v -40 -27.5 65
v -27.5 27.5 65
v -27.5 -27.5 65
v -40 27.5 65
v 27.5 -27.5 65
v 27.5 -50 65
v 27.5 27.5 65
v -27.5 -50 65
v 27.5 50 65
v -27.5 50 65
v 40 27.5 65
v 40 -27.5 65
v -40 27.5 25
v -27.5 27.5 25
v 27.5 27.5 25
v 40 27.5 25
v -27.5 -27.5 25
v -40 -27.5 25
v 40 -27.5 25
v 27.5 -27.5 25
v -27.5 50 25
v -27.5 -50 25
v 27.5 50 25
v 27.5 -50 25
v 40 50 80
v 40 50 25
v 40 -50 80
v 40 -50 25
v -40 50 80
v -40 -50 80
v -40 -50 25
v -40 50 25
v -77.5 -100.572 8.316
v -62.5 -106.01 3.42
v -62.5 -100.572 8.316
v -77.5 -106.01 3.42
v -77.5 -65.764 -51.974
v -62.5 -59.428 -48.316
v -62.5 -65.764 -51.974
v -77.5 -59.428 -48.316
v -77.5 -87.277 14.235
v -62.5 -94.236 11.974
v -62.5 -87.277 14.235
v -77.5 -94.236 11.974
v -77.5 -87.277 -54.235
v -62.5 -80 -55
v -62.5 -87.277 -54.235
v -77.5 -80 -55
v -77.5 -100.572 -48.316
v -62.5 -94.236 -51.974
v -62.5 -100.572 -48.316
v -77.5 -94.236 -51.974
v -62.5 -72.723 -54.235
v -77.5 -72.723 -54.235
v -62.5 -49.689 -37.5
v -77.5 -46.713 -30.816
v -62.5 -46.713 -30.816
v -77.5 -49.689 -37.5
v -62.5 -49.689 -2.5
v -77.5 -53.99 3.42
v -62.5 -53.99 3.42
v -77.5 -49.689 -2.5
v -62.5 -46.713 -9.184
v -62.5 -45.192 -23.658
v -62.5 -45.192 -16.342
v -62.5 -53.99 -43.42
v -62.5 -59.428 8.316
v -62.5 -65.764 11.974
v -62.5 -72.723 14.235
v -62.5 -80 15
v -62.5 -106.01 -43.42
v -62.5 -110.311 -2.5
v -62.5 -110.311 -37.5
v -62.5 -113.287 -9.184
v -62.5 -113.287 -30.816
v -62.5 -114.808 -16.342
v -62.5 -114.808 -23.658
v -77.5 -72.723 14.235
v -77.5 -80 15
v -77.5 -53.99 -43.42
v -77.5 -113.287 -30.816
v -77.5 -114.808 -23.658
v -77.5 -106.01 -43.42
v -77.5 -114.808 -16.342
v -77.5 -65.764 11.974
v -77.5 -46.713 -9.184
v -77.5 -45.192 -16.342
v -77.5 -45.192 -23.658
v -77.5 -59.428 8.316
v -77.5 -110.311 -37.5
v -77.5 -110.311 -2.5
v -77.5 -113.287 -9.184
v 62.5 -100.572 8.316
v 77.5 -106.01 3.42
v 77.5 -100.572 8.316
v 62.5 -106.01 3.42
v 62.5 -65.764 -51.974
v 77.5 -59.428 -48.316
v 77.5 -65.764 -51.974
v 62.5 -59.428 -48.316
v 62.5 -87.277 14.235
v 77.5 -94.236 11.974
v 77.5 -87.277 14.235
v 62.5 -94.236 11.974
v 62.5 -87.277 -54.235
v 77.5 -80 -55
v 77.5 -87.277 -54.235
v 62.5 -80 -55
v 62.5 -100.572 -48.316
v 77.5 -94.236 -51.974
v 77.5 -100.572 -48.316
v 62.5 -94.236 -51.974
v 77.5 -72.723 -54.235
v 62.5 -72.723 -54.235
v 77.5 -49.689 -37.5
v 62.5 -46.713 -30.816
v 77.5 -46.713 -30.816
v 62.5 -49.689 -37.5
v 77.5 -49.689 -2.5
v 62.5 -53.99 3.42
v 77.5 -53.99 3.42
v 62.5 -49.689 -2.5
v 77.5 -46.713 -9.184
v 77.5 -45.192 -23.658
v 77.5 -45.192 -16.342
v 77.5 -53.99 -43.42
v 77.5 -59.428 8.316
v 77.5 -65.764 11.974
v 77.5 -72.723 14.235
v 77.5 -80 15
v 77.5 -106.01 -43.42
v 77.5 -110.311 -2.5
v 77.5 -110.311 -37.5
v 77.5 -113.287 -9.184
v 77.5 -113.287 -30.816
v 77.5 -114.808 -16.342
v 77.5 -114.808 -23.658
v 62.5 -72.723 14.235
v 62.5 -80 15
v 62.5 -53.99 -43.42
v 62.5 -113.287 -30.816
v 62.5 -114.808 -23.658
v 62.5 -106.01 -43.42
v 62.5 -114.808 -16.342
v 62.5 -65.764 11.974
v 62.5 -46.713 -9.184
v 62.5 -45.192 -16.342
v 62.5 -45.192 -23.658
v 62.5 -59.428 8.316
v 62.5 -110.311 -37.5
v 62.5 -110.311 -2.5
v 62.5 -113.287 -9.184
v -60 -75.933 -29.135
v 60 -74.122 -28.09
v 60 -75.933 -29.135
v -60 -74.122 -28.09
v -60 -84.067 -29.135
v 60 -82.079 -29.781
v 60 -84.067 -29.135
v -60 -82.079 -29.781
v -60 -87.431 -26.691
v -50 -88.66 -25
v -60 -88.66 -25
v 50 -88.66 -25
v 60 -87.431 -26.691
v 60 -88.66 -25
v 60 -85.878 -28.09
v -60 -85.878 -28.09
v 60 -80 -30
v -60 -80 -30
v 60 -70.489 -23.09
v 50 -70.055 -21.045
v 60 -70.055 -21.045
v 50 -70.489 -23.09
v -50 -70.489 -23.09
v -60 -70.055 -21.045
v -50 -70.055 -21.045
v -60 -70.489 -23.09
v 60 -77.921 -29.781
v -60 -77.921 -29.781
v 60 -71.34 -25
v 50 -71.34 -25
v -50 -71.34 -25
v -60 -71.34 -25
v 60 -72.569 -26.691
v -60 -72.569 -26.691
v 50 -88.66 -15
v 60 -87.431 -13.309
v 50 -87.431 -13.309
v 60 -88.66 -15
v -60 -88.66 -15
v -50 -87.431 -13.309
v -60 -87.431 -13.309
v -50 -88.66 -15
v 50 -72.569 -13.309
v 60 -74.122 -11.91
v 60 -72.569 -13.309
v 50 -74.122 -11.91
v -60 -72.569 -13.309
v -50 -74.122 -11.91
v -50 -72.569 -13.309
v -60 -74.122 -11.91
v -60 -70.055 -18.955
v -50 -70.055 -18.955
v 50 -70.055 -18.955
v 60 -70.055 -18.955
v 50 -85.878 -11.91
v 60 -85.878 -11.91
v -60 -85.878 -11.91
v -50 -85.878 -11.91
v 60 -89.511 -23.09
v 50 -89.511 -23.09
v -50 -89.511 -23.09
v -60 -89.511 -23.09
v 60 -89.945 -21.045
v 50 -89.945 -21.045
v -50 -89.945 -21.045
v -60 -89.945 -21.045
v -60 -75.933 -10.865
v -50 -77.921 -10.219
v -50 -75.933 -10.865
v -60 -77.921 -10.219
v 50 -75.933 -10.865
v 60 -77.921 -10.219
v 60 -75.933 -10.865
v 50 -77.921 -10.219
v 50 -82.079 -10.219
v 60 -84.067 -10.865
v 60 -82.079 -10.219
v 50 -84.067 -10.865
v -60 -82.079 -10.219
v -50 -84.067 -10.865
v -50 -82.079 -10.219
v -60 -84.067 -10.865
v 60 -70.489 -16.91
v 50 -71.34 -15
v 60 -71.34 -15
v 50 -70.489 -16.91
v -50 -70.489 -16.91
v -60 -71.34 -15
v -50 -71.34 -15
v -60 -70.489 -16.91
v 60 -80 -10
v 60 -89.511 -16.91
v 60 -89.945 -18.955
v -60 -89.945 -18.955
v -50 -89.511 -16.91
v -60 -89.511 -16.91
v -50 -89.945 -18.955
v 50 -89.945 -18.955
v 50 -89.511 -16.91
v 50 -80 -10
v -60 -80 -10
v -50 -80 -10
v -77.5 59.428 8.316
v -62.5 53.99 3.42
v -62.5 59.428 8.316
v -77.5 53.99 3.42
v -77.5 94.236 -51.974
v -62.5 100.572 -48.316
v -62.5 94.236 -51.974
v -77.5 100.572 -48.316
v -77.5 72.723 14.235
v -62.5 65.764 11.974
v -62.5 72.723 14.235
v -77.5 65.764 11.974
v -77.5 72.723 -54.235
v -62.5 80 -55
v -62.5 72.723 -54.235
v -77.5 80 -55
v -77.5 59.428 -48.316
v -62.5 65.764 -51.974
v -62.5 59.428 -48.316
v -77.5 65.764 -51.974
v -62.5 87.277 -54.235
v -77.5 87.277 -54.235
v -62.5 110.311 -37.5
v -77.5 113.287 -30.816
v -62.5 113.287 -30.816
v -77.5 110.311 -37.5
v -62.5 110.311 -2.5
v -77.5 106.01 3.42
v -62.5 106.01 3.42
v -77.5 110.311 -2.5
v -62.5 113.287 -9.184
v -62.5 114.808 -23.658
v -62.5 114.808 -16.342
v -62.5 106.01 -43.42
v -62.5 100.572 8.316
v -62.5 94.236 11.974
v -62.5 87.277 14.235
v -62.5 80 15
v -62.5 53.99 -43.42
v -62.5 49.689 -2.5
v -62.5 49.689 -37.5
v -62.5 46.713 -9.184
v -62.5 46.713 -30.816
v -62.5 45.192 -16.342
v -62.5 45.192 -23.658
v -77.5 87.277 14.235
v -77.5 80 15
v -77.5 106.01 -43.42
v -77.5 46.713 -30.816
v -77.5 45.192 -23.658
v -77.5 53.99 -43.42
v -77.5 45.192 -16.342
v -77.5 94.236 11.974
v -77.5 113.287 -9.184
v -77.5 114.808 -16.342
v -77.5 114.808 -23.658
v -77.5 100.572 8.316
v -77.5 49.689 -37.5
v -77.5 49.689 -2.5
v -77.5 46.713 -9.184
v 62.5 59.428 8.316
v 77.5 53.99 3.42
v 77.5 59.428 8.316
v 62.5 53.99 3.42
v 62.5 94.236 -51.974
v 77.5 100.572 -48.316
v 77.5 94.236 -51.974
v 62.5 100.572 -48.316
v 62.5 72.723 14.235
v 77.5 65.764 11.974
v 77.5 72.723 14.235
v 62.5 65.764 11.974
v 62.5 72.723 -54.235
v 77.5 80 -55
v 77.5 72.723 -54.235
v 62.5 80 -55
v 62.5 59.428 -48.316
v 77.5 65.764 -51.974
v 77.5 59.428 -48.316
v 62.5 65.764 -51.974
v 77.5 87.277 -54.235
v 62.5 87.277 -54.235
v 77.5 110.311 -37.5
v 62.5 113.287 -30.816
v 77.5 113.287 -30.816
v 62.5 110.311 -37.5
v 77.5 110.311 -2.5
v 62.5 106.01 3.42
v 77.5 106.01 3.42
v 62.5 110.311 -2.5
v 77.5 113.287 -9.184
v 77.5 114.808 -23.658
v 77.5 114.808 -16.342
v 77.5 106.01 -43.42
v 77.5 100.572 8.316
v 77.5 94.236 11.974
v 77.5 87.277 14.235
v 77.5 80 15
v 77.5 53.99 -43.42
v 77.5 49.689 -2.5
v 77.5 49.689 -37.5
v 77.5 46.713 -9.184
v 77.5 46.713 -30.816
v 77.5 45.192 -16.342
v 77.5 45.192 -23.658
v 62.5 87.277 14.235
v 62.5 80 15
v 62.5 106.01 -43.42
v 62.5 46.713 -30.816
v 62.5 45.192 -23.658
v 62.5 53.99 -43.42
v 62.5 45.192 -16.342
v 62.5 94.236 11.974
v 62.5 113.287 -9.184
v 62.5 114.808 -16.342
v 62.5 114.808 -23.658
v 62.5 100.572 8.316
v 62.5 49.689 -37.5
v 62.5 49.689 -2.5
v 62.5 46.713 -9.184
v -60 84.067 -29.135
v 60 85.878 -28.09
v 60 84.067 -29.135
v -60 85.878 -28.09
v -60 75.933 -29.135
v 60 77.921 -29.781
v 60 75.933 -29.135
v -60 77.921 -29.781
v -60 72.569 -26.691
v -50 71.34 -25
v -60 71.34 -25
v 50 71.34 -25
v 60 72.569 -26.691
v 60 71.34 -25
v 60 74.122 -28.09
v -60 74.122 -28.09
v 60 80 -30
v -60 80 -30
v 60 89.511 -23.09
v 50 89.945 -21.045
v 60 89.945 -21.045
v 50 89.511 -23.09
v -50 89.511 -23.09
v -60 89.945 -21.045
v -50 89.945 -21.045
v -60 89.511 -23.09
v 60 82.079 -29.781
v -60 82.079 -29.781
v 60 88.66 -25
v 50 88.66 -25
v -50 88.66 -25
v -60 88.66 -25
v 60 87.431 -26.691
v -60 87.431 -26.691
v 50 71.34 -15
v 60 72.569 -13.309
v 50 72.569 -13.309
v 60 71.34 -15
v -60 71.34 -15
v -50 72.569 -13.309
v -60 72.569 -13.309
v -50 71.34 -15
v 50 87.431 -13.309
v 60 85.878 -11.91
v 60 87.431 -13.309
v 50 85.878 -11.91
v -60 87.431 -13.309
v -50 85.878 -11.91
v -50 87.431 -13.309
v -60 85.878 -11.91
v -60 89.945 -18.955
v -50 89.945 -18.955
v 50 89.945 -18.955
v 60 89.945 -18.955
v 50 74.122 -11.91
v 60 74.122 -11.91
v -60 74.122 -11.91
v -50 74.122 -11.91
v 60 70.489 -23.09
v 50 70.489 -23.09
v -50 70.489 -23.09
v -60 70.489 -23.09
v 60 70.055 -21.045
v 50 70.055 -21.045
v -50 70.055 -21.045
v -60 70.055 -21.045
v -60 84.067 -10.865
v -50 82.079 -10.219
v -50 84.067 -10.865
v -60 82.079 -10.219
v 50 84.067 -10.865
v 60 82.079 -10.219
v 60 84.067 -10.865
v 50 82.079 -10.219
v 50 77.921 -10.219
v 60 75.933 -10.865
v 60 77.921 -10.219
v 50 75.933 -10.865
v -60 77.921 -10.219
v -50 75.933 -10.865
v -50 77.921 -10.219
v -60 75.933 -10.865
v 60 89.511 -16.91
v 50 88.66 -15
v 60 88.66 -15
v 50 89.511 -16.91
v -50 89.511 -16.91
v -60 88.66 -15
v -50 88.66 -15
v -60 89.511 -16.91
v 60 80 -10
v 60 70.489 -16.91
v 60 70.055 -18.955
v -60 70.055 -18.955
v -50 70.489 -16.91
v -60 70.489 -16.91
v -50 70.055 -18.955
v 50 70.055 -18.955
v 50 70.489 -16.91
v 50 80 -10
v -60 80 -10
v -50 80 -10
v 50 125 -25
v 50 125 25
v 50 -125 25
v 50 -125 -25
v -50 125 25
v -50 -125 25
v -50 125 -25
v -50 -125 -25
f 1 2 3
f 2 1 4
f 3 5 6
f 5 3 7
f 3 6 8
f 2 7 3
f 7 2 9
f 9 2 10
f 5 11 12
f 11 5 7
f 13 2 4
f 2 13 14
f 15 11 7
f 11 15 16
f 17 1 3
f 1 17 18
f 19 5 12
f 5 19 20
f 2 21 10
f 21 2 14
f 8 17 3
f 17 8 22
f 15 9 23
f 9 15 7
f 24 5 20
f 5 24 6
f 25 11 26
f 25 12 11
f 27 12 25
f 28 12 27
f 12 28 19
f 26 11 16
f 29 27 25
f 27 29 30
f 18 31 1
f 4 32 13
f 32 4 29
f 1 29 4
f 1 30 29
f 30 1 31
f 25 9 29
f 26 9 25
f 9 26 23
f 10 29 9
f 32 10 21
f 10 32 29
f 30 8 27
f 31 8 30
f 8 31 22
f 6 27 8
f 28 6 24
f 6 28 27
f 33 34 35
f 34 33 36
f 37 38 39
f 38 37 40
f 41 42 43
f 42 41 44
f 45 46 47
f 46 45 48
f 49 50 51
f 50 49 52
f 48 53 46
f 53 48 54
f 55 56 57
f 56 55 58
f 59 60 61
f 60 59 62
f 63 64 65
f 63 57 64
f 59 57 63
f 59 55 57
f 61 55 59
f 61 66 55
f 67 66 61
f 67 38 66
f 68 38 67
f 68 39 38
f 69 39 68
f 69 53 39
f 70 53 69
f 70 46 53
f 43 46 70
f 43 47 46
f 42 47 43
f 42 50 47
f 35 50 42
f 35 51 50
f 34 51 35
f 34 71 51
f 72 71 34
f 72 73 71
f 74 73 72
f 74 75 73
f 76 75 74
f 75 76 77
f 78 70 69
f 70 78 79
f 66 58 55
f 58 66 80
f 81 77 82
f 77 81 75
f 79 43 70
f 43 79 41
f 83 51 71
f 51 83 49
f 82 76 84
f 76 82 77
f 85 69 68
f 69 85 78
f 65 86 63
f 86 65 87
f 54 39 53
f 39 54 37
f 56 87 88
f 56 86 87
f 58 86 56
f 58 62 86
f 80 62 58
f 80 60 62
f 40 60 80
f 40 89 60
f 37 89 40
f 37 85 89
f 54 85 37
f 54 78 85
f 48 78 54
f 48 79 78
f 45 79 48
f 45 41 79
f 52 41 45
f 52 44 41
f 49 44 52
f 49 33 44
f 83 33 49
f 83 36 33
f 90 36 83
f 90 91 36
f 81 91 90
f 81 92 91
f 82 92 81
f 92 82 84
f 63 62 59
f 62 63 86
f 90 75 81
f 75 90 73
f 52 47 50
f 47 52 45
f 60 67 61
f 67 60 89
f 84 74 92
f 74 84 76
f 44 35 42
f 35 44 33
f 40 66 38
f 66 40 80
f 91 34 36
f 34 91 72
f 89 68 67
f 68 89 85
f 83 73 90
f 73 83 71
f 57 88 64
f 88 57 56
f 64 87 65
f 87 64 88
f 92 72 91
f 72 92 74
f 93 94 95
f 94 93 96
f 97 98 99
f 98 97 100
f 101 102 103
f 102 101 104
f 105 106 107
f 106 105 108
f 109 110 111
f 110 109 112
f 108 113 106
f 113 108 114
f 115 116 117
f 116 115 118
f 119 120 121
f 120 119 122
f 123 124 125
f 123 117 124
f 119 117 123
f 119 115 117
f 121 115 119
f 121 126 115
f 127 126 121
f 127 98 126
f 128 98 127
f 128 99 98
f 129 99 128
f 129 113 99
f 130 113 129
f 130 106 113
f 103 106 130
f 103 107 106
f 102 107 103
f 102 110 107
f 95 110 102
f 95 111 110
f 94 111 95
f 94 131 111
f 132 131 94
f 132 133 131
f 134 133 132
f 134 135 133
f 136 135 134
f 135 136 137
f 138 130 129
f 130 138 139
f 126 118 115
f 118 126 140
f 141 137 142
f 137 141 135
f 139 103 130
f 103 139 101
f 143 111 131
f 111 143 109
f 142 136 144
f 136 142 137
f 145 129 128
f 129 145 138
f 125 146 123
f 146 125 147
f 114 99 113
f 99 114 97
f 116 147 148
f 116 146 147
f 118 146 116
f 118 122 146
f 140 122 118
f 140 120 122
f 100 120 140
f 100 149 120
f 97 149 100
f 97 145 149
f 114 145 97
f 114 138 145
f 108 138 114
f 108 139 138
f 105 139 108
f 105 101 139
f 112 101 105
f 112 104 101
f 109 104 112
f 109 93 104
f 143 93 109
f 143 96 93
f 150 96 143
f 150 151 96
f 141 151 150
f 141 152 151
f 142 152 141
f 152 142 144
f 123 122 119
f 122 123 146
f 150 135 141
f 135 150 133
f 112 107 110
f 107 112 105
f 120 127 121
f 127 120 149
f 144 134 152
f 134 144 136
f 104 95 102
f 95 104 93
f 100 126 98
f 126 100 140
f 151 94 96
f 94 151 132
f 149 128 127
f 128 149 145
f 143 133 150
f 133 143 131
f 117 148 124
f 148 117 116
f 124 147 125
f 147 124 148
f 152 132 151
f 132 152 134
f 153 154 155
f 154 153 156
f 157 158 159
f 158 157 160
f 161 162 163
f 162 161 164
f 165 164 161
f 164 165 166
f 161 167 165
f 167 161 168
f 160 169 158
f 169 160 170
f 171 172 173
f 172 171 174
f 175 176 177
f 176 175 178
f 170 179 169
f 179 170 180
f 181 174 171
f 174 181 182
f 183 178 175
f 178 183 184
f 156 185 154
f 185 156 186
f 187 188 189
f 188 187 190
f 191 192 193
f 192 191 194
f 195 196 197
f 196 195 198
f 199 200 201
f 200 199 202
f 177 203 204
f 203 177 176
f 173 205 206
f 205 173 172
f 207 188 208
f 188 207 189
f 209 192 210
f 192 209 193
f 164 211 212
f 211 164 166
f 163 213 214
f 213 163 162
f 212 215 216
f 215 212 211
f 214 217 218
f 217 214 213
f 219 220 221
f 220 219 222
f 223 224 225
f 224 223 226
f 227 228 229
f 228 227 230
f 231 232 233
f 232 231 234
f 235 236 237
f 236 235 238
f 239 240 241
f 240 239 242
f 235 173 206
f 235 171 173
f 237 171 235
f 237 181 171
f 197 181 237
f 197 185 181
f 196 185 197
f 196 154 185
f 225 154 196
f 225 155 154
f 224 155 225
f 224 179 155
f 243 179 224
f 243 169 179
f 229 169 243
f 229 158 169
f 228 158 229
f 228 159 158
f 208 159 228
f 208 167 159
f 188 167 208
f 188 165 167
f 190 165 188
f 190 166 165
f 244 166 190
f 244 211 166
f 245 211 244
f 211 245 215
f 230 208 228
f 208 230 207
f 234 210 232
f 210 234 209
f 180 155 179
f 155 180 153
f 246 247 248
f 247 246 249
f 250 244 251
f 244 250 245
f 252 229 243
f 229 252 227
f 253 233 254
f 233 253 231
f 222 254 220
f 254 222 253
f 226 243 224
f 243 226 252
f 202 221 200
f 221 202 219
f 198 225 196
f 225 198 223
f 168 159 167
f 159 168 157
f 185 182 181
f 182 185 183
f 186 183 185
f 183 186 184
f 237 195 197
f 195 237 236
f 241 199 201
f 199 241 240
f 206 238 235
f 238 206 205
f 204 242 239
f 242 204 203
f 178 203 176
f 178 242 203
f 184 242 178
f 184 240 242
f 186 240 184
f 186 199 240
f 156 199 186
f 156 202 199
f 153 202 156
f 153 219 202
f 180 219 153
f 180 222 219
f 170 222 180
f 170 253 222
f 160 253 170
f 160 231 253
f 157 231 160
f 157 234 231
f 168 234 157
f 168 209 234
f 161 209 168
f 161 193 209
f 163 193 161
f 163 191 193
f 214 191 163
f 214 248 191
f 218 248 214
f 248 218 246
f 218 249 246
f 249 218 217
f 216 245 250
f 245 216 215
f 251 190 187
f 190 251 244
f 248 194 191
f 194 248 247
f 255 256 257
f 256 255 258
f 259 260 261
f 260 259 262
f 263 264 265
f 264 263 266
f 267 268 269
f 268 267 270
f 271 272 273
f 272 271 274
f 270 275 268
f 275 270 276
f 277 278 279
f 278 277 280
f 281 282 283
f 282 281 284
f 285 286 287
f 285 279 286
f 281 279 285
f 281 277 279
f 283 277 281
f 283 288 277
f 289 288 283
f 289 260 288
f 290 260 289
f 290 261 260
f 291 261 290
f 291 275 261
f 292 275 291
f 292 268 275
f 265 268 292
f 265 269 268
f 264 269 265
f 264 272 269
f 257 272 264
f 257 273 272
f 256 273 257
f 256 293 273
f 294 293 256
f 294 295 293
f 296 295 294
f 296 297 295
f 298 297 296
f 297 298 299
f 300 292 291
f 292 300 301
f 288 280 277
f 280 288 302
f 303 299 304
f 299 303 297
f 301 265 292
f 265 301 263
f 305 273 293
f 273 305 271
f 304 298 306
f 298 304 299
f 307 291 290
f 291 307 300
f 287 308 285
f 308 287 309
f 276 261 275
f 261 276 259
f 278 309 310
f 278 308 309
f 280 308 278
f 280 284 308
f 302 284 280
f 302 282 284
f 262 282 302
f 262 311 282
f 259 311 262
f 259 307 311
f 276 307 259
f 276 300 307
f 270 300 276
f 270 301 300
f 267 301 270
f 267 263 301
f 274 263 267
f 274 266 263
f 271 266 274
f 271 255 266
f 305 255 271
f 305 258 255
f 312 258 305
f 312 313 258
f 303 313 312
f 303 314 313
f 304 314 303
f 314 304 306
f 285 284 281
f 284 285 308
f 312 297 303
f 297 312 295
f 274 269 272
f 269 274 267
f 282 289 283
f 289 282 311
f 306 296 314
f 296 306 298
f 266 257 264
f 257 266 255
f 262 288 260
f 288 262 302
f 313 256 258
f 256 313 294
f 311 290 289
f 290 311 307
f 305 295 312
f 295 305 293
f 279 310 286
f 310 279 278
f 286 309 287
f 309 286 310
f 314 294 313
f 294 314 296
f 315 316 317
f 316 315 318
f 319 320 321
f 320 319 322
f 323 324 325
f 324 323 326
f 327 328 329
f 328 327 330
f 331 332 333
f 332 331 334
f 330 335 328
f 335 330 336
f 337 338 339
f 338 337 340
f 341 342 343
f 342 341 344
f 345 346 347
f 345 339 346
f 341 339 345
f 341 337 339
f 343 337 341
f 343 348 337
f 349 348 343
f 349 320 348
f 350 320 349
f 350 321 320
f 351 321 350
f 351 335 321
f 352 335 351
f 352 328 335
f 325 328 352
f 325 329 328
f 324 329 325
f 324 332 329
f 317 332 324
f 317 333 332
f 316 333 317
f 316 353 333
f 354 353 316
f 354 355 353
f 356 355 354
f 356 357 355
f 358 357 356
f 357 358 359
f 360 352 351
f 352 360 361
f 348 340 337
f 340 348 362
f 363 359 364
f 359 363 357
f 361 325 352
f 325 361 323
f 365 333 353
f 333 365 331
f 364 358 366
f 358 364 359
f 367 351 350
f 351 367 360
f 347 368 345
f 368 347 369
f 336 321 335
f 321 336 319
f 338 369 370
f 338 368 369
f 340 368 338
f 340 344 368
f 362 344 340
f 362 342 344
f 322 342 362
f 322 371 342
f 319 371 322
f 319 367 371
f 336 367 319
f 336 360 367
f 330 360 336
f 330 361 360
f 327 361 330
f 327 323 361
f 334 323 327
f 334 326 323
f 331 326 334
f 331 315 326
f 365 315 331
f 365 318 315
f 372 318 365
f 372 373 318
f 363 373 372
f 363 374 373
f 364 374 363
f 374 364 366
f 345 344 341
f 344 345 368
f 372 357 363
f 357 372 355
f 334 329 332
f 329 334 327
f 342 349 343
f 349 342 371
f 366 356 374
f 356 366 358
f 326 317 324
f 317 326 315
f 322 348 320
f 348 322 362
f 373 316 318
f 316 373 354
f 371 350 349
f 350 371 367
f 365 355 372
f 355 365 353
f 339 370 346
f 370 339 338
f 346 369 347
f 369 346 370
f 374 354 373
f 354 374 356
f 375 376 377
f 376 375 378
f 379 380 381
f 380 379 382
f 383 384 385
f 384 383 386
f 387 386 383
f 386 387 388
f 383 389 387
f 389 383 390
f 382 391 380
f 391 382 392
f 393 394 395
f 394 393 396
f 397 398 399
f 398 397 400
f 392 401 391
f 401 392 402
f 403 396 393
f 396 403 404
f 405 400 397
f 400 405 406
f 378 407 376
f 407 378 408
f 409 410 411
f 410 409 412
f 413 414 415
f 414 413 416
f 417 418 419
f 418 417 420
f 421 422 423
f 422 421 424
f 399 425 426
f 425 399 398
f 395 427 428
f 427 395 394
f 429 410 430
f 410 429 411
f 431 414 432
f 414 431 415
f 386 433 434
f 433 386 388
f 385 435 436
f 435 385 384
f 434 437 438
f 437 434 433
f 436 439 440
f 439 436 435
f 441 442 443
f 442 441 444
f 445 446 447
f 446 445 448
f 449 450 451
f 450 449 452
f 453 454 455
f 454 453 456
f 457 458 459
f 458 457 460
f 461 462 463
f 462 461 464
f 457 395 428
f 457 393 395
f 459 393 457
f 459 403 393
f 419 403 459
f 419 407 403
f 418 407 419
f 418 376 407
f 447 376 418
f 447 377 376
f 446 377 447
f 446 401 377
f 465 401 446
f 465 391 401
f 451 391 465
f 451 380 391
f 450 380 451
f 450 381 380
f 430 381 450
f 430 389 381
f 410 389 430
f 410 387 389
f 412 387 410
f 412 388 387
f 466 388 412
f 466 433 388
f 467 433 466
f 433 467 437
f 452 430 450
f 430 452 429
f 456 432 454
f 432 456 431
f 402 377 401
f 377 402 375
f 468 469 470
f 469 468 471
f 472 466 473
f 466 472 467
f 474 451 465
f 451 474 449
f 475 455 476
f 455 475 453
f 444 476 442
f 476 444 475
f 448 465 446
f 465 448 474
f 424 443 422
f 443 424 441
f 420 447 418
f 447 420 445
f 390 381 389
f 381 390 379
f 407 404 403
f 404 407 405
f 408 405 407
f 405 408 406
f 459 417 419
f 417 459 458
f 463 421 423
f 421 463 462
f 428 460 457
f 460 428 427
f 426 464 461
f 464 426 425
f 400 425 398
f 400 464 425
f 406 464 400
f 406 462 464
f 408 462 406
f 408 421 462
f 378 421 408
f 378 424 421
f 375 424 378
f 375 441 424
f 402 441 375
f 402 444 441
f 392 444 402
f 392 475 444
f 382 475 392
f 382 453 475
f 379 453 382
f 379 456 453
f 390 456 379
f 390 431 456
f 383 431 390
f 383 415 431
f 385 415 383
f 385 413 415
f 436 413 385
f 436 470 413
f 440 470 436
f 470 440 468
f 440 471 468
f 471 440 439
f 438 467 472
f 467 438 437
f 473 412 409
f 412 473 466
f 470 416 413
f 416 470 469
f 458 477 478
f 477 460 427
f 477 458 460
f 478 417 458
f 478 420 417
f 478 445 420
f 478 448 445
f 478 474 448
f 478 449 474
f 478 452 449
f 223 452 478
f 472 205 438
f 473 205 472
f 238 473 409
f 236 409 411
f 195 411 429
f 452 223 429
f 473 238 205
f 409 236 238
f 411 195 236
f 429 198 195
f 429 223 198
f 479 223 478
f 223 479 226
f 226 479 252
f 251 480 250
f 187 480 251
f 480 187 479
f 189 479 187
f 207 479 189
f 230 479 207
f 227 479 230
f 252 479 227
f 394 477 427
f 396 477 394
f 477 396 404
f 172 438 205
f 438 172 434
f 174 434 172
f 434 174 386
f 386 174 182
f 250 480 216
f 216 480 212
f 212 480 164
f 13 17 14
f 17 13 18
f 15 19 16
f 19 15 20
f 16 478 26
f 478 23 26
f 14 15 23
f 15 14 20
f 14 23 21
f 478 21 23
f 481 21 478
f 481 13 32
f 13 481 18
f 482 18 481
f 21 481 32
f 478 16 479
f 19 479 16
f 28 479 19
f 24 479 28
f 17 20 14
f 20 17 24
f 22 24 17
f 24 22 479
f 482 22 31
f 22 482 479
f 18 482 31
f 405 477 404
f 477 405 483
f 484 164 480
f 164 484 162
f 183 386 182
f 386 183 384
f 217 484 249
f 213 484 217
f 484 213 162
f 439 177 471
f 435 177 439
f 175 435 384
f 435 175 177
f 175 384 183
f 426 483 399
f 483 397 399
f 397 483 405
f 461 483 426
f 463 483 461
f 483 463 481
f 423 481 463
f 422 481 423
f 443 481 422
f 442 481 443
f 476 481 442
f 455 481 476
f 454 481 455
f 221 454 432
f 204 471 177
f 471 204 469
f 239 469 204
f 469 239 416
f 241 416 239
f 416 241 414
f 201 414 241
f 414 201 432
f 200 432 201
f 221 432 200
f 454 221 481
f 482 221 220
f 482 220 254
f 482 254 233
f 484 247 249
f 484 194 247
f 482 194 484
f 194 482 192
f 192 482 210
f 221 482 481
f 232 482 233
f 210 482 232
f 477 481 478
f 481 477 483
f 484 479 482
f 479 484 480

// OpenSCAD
union() {
	cube(center = true, size = [100, 250, 50]);
	translate(v = [0, 0, 50]) {
		difference() {
			cube(center = true, size = [80, 100, 60]);
			union() {
				translate(v = [0, 0, -10]) {
					cube(center = true, size = [200, 55, 50]);
				}
				rotate(a = [0, 0, 90]) {
					translate(v = [0, 0, -10]) {
						cube(center = true, size = [200, 55, 50]);
					}
				}
			}
		}
	}
	translate(v = [0, -80, 0]) {
		translate(v = [0, 0, -20]) {
			union() {
				translate(v = [-70, 0, 0]) {
					rotate(a = [0, 90, 0]) {
						cylinder(center = true, h = 15, r = 35);
					}
				}
				translate(v = [70, 0, 0]) {
					rotate(a = [0, 90, 0]) {
						cylinder(center = true, h = 15, r = 35);
					}
				}
				rotate(a = [0, 90, 0]) {
					cylinder(center = true, h = 120, r = 10);
				}
			}
		}
	}
	translate(v = [0, 160, 0]) {
		translate(v = [0, -80, 0]) {
			translate(v = [0, 0, -20]) {
				union() {
					translate(v = [-70, 0, 0]) {
						rotate(a = [0, 90, 0]) {
							cylinder(center = true, h = 15, r = 35);
						}
					}
					translate(v = [70, 0, 0]) {
						rotate(a = [0, 90, 0]) {
							cylinder(center = true, h = 15, r = 35);
						}
					}
					rotate(a = [0, 90, 0]) {
						cylinder(center = true, h = 120, r = 10);
					}
				}
			}
		}
	}
}
